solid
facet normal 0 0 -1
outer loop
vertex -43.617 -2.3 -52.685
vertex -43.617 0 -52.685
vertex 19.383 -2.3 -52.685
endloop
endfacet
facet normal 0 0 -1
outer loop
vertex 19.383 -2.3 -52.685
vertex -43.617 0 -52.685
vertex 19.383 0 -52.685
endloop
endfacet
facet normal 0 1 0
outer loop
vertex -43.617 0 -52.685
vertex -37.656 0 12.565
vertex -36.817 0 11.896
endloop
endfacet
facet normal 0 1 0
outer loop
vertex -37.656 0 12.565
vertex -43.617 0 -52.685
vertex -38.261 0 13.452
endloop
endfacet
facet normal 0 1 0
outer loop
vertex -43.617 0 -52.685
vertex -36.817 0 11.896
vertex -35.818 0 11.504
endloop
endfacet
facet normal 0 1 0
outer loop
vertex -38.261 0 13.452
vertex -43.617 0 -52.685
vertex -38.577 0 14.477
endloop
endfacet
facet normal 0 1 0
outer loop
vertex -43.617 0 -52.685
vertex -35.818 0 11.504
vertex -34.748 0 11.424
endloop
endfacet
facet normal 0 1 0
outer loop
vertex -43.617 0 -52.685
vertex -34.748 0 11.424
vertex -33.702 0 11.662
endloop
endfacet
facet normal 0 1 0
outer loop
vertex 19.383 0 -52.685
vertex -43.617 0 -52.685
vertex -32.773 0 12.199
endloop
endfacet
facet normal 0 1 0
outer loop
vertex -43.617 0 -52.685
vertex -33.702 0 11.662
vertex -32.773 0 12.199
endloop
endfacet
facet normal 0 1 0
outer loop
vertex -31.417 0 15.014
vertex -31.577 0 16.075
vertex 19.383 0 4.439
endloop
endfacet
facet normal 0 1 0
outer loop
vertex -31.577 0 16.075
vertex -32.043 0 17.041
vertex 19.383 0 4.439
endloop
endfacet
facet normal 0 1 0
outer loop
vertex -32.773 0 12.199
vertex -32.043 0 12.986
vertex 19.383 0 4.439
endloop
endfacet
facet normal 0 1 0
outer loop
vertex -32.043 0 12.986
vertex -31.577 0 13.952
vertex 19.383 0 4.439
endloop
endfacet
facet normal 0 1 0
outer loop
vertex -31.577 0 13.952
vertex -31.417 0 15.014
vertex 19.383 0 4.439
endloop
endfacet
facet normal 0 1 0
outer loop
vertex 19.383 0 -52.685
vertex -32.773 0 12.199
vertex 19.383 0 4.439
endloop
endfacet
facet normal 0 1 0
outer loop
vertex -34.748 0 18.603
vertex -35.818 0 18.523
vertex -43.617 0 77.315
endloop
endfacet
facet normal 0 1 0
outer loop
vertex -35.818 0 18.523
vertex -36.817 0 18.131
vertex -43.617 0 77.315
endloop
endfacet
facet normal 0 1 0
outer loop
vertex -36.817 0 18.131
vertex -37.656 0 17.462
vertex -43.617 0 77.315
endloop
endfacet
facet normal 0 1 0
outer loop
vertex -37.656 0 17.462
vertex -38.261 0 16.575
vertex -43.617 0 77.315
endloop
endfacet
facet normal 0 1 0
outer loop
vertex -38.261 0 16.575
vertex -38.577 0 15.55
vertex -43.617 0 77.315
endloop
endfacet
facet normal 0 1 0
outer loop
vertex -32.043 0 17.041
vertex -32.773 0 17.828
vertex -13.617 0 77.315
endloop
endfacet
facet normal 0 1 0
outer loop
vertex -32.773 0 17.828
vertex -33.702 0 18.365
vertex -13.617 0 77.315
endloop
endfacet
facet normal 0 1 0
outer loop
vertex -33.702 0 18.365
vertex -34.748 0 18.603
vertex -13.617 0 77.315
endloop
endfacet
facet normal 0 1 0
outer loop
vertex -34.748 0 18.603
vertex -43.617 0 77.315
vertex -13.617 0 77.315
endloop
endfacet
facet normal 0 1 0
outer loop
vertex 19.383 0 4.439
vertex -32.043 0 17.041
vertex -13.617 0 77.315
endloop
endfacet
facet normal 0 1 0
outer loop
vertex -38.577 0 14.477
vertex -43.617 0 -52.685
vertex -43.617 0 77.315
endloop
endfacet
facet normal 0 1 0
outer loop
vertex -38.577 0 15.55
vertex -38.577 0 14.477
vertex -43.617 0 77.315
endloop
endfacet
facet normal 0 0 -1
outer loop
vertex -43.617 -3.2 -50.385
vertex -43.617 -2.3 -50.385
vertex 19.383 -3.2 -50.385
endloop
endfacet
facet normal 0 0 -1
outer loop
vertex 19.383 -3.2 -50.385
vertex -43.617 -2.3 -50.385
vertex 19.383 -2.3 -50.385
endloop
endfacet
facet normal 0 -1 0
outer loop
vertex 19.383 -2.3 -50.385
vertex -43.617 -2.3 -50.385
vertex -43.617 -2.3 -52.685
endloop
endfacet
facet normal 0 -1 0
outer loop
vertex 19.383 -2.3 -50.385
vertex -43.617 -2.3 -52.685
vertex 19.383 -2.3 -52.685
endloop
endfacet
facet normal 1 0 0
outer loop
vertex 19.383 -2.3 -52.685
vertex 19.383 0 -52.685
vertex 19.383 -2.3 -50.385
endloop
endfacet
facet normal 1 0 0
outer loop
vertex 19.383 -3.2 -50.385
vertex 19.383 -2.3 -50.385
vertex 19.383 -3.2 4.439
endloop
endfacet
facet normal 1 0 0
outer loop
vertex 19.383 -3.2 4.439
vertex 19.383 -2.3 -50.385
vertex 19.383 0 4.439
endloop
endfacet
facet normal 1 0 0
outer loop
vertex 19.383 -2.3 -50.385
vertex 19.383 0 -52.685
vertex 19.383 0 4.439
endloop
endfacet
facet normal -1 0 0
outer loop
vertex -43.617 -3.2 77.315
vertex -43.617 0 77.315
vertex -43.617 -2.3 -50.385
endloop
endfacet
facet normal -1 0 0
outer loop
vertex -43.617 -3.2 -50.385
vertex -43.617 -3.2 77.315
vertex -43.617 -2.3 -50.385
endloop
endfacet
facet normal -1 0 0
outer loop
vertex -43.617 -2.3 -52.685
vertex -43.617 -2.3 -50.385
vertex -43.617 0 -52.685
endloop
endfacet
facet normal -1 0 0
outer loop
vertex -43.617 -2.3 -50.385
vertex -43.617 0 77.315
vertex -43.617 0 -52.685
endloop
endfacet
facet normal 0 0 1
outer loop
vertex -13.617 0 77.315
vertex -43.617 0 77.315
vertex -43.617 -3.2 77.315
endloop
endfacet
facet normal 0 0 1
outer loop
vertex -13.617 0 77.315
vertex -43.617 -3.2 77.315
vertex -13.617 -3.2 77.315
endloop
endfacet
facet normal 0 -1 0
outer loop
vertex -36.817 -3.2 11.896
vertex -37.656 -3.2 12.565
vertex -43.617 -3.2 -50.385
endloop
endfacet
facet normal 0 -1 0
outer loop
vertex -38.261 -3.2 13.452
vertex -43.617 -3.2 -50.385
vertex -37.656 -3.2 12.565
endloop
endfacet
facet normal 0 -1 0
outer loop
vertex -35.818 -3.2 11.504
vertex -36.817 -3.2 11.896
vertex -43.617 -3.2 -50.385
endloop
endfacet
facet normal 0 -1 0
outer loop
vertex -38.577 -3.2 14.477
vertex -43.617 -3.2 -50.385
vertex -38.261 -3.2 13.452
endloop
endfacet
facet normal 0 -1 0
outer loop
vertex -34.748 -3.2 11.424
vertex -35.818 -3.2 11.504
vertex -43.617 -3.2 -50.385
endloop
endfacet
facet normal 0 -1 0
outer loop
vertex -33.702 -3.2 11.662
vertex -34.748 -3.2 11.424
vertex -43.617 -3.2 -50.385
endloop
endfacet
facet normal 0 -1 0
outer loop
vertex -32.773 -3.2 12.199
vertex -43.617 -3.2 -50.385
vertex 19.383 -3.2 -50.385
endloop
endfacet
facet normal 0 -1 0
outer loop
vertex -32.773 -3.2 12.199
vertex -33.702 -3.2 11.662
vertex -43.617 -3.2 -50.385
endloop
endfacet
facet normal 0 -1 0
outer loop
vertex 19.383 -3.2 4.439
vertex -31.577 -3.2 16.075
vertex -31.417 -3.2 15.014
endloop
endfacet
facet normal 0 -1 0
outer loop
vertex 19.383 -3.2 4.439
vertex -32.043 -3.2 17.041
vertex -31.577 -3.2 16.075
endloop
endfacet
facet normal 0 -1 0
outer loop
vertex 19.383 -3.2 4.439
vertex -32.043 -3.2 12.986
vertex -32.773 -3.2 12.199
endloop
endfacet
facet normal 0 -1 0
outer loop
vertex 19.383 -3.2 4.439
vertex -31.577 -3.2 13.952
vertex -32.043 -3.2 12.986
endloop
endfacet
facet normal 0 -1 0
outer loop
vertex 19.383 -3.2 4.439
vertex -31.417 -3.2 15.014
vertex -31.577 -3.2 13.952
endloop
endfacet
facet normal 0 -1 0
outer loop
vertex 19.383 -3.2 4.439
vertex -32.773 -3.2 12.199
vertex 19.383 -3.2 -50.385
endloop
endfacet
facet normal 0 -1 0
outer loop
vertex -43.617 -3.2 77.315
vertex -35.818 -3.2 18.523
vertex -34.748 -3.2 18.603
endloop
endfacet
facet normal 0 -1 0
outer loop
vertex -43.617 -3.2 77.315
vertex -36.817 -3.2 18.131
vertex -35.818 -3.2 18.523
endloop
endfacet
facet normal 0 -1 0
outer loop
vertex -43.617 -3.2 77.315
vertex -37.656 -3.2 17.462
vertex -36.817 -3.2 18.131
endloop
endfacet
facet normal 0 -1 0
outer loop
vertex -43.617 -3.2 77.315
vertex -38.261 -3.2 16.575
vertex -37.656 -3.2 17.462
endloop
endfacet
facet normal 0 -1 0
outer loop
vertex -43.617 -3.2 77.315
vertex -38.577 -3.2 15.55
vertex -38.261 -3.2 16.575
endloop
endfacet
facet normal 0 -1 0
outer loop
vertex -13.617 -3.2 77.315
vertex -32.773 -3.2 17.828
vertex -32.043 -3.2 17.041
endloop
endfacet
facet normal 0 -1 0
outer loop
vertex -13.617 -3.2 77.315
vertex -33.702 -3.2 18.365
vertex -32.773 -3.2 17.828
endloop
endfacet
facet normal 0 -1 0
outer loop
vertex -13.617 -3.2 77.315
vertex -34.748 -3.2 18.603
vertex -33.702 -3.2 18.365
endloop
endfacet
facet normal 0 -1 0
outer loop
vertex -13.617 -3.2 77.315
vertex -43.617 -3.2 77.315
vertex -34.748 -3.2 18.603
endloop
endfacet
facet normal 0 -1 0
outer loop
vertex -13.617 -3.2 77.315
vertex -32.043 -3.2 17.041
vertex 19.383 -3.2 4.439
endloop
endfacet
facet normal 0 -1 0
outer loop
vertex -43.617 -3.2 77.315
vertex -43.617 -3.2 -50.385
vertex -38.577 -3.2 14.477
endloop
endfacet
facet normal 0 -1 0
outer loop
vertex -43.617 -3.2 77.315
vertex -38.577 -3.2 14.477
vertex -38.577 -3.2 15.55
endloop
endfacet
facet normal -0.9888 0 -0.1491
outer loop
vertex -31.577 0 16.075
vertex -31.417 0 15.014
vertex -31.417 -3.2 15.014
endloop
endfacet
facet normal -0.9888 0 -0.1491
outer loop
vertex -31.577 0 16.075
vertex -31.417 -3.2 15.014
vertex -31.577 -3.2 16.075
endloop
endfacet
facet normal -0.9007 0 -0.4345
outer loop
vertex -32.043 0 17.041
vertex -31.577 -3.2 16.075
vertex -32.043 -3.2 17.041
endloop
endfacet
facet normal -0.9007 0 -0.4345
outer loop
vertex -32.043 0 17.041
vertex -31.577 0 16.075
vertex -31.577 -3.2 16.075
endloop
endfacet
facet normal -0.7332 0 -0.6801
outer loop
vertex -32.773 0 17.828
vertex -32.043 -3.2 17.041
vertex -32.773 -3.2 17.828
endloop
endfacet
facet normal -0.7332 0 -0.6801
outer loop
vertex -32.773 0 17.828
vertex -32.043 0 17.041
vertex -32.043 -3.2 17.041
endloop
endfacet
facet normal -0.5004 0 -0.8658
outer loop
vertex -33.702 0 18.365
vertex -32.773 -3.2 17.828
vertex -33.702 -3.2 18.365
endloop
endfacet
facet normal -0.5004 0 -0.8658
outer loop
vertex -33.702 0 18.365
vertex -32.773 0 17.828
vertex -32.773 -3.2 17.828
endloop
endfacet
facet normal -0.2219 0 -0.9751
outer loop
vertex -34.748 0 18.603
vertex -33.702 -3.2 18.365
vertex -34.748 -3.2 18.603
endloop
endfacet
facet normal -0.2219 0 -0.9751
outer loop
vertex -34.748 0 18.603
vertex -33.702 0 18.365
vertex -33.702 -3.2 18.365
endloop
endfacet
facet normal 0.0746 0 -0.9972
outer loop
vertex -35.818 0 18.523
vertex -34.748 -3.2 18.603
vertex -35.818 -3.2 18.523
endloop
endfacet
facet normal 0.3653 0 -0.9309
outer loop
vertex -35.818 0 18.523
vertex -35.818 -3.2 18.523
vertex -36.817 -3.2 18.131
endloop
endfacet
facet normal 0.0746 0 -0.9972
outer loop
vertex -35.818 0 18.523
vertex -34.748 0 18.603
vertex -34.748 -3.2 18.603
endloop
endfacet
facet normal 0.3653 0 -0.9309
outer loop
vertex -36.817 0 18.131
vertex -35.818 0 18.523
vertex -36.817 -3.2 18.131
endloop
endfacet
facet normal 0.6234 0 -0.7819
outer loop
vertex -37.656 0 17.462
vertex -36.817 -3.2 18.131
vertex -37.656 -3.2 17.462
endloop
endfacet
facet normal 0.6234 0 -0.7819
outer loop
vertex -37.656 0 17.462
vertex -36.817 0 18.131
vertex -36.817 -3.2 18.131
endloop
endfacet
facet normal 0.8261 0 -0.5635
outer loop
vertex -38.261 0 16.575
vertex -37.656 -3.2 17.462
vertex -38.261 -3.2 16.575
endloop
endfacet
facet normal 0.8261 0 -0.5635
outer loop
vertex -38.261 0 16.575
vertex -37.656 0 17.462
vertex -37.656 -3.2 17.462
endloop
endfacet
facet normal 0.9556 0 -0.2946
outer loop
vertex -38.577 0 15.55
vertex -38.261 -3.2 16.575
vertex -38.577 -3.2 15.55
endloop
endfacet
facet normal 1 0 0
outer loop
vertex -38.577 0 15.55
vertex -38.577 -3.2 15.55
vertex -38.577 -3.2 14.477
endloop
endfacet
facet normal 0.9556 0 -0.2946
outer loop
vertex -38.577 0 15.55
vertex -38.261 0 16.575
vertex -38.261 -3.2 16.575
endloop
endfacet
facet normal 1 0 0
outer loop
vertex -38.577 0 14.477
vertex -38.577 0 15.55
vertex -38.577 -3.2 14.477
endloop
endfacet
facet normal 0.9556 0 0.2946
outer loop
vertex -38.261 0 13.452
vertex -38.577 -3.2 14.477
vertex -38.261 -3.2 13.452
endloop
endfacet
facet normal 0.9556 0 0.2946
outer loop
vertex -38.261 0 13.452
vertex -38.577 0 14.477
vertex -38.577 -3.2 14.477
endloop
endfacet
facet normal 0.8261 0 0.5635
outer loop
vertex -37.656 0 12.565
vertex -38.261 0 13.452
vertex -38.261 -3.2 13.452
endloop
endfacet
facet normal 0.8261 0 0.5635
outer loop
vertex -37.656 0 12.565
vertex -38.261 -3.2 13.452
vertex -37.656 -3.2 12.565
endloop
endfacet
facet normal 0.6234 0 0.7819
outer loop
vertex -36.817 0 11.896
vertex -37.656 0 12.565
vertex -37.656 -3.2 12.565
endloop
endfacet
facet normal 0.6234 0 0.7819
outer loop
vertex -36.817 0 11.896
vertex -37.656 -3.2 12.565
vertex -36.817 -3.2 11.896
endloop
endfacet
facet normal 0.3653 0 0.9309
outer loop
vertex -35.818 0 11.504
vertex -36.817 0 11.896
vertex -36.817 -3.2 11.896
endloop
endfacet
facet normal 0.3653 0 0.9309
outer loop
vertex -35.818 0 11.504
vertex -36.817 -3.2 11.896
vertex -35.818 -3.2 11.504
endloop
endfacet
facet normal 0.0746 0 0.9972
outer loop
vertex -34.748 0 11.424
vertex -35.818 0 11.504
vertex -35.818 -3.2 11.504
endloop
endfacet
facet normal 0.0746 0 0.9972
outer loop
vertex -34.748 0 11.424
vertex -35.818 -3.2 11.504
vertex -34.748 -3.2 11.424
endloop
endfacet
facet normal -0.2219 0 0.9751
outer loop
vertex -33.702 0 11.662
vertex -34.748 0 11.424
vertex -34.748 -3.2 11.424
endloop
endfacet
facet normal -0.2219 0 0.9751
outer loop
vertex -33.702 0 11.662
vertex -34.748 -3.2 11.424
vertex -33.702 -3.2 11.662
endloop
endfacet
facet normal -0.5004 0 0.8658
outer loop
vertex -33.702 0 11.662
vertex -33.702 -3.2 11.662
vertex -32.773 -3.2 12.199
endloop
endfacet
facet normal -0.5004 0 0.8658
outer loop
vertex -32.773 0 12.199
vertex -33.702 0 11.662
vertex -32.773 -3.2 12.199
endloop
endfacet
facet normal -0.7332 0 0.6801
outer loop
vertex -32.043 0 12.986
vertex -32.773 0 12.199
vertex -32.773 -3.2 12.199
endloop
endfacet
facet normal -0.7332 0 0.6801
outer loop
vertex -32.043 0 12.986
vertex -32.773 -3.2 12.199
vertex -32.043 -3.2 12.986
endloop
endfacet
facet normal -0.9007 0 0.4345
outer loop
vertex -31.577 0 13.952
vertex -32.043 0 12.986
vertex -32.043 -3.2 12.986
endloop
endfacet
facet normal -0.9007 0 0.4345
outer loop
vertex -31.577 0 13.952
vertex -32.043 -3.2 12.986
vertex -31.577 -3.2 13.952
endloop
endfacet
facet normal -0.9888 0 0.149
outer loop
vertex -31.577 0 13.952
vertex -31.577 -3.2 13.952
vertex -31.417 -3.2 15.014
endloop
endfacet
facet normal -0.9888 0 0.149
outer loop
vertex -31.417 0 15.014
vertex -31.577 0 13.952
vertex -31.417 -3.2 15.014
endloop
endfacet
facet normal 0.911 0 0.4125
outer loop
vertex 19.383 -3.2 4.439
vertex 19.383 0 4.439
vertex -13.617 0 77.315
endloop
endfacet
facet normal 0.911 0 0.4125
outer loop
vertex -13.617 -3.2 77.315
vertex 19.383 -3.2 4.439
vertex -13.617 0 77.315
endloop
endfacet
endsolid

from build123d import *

# Parameters (mm, degrees)
F0_R     = 3.6
F0_W     = 30
F0_H     = 45.876608
F0_W_2   = 63
F0_H_2   = 54.823392
F1_DEPTH = 3.2
F0_H_3   = 2.3
F2_DEPTH = 2.3


with BuildPart() as f1:
    # F0 (on Front) → F1 (new body)
    with BuildSketch(Plane.XZ):
        Polygon((-43.617142, 31.438855), (-43.617142, 4.438855), (19.382858, 4.438855), (-13.617142, 77.315463), (-13.617142, 31.438855), align=None)
        with Locations((-35.017142, 15.013501)):
            Circle(F0_R, mode=Mode.SUBTRACT)
        with Locations((-28.617142, 54.377159)):
            Rectangle(F0_W, F0_H)
        with Locations((-12.117142, -22.972841)):
            Rectangle(F0_W_2, F0_H_2)
    extrude(amount=F1_DEPTH)

    # F0 (on Front) → F2 (join)
    with BuildSketch(Plane.XZ):
        Polygon((-43.617142, 31.438855), (-43.617142, 4.438855), (19.382858, 4.438855), (-13.617142, 77.315463), (-13.617142, 31.438855), align=None)
        with Locations((-35.017142, 15.013501)):
            Circle(F0_R, mode=Mode.SUBTRACT)
        with Locations((-12.117142, -22.972841)):
            Rectangle(F0_W_2, F0_H_2)
        with Locations((-12.117142, -51.534537)):
            Rectangle(F0_W_2, F0_H_3)
        with Locations((-28.617142, 54.377159)):
            Rectangle(F0_W, F0_H)
    extrude(amount=F2_DEPTH)


solid = f1.part
